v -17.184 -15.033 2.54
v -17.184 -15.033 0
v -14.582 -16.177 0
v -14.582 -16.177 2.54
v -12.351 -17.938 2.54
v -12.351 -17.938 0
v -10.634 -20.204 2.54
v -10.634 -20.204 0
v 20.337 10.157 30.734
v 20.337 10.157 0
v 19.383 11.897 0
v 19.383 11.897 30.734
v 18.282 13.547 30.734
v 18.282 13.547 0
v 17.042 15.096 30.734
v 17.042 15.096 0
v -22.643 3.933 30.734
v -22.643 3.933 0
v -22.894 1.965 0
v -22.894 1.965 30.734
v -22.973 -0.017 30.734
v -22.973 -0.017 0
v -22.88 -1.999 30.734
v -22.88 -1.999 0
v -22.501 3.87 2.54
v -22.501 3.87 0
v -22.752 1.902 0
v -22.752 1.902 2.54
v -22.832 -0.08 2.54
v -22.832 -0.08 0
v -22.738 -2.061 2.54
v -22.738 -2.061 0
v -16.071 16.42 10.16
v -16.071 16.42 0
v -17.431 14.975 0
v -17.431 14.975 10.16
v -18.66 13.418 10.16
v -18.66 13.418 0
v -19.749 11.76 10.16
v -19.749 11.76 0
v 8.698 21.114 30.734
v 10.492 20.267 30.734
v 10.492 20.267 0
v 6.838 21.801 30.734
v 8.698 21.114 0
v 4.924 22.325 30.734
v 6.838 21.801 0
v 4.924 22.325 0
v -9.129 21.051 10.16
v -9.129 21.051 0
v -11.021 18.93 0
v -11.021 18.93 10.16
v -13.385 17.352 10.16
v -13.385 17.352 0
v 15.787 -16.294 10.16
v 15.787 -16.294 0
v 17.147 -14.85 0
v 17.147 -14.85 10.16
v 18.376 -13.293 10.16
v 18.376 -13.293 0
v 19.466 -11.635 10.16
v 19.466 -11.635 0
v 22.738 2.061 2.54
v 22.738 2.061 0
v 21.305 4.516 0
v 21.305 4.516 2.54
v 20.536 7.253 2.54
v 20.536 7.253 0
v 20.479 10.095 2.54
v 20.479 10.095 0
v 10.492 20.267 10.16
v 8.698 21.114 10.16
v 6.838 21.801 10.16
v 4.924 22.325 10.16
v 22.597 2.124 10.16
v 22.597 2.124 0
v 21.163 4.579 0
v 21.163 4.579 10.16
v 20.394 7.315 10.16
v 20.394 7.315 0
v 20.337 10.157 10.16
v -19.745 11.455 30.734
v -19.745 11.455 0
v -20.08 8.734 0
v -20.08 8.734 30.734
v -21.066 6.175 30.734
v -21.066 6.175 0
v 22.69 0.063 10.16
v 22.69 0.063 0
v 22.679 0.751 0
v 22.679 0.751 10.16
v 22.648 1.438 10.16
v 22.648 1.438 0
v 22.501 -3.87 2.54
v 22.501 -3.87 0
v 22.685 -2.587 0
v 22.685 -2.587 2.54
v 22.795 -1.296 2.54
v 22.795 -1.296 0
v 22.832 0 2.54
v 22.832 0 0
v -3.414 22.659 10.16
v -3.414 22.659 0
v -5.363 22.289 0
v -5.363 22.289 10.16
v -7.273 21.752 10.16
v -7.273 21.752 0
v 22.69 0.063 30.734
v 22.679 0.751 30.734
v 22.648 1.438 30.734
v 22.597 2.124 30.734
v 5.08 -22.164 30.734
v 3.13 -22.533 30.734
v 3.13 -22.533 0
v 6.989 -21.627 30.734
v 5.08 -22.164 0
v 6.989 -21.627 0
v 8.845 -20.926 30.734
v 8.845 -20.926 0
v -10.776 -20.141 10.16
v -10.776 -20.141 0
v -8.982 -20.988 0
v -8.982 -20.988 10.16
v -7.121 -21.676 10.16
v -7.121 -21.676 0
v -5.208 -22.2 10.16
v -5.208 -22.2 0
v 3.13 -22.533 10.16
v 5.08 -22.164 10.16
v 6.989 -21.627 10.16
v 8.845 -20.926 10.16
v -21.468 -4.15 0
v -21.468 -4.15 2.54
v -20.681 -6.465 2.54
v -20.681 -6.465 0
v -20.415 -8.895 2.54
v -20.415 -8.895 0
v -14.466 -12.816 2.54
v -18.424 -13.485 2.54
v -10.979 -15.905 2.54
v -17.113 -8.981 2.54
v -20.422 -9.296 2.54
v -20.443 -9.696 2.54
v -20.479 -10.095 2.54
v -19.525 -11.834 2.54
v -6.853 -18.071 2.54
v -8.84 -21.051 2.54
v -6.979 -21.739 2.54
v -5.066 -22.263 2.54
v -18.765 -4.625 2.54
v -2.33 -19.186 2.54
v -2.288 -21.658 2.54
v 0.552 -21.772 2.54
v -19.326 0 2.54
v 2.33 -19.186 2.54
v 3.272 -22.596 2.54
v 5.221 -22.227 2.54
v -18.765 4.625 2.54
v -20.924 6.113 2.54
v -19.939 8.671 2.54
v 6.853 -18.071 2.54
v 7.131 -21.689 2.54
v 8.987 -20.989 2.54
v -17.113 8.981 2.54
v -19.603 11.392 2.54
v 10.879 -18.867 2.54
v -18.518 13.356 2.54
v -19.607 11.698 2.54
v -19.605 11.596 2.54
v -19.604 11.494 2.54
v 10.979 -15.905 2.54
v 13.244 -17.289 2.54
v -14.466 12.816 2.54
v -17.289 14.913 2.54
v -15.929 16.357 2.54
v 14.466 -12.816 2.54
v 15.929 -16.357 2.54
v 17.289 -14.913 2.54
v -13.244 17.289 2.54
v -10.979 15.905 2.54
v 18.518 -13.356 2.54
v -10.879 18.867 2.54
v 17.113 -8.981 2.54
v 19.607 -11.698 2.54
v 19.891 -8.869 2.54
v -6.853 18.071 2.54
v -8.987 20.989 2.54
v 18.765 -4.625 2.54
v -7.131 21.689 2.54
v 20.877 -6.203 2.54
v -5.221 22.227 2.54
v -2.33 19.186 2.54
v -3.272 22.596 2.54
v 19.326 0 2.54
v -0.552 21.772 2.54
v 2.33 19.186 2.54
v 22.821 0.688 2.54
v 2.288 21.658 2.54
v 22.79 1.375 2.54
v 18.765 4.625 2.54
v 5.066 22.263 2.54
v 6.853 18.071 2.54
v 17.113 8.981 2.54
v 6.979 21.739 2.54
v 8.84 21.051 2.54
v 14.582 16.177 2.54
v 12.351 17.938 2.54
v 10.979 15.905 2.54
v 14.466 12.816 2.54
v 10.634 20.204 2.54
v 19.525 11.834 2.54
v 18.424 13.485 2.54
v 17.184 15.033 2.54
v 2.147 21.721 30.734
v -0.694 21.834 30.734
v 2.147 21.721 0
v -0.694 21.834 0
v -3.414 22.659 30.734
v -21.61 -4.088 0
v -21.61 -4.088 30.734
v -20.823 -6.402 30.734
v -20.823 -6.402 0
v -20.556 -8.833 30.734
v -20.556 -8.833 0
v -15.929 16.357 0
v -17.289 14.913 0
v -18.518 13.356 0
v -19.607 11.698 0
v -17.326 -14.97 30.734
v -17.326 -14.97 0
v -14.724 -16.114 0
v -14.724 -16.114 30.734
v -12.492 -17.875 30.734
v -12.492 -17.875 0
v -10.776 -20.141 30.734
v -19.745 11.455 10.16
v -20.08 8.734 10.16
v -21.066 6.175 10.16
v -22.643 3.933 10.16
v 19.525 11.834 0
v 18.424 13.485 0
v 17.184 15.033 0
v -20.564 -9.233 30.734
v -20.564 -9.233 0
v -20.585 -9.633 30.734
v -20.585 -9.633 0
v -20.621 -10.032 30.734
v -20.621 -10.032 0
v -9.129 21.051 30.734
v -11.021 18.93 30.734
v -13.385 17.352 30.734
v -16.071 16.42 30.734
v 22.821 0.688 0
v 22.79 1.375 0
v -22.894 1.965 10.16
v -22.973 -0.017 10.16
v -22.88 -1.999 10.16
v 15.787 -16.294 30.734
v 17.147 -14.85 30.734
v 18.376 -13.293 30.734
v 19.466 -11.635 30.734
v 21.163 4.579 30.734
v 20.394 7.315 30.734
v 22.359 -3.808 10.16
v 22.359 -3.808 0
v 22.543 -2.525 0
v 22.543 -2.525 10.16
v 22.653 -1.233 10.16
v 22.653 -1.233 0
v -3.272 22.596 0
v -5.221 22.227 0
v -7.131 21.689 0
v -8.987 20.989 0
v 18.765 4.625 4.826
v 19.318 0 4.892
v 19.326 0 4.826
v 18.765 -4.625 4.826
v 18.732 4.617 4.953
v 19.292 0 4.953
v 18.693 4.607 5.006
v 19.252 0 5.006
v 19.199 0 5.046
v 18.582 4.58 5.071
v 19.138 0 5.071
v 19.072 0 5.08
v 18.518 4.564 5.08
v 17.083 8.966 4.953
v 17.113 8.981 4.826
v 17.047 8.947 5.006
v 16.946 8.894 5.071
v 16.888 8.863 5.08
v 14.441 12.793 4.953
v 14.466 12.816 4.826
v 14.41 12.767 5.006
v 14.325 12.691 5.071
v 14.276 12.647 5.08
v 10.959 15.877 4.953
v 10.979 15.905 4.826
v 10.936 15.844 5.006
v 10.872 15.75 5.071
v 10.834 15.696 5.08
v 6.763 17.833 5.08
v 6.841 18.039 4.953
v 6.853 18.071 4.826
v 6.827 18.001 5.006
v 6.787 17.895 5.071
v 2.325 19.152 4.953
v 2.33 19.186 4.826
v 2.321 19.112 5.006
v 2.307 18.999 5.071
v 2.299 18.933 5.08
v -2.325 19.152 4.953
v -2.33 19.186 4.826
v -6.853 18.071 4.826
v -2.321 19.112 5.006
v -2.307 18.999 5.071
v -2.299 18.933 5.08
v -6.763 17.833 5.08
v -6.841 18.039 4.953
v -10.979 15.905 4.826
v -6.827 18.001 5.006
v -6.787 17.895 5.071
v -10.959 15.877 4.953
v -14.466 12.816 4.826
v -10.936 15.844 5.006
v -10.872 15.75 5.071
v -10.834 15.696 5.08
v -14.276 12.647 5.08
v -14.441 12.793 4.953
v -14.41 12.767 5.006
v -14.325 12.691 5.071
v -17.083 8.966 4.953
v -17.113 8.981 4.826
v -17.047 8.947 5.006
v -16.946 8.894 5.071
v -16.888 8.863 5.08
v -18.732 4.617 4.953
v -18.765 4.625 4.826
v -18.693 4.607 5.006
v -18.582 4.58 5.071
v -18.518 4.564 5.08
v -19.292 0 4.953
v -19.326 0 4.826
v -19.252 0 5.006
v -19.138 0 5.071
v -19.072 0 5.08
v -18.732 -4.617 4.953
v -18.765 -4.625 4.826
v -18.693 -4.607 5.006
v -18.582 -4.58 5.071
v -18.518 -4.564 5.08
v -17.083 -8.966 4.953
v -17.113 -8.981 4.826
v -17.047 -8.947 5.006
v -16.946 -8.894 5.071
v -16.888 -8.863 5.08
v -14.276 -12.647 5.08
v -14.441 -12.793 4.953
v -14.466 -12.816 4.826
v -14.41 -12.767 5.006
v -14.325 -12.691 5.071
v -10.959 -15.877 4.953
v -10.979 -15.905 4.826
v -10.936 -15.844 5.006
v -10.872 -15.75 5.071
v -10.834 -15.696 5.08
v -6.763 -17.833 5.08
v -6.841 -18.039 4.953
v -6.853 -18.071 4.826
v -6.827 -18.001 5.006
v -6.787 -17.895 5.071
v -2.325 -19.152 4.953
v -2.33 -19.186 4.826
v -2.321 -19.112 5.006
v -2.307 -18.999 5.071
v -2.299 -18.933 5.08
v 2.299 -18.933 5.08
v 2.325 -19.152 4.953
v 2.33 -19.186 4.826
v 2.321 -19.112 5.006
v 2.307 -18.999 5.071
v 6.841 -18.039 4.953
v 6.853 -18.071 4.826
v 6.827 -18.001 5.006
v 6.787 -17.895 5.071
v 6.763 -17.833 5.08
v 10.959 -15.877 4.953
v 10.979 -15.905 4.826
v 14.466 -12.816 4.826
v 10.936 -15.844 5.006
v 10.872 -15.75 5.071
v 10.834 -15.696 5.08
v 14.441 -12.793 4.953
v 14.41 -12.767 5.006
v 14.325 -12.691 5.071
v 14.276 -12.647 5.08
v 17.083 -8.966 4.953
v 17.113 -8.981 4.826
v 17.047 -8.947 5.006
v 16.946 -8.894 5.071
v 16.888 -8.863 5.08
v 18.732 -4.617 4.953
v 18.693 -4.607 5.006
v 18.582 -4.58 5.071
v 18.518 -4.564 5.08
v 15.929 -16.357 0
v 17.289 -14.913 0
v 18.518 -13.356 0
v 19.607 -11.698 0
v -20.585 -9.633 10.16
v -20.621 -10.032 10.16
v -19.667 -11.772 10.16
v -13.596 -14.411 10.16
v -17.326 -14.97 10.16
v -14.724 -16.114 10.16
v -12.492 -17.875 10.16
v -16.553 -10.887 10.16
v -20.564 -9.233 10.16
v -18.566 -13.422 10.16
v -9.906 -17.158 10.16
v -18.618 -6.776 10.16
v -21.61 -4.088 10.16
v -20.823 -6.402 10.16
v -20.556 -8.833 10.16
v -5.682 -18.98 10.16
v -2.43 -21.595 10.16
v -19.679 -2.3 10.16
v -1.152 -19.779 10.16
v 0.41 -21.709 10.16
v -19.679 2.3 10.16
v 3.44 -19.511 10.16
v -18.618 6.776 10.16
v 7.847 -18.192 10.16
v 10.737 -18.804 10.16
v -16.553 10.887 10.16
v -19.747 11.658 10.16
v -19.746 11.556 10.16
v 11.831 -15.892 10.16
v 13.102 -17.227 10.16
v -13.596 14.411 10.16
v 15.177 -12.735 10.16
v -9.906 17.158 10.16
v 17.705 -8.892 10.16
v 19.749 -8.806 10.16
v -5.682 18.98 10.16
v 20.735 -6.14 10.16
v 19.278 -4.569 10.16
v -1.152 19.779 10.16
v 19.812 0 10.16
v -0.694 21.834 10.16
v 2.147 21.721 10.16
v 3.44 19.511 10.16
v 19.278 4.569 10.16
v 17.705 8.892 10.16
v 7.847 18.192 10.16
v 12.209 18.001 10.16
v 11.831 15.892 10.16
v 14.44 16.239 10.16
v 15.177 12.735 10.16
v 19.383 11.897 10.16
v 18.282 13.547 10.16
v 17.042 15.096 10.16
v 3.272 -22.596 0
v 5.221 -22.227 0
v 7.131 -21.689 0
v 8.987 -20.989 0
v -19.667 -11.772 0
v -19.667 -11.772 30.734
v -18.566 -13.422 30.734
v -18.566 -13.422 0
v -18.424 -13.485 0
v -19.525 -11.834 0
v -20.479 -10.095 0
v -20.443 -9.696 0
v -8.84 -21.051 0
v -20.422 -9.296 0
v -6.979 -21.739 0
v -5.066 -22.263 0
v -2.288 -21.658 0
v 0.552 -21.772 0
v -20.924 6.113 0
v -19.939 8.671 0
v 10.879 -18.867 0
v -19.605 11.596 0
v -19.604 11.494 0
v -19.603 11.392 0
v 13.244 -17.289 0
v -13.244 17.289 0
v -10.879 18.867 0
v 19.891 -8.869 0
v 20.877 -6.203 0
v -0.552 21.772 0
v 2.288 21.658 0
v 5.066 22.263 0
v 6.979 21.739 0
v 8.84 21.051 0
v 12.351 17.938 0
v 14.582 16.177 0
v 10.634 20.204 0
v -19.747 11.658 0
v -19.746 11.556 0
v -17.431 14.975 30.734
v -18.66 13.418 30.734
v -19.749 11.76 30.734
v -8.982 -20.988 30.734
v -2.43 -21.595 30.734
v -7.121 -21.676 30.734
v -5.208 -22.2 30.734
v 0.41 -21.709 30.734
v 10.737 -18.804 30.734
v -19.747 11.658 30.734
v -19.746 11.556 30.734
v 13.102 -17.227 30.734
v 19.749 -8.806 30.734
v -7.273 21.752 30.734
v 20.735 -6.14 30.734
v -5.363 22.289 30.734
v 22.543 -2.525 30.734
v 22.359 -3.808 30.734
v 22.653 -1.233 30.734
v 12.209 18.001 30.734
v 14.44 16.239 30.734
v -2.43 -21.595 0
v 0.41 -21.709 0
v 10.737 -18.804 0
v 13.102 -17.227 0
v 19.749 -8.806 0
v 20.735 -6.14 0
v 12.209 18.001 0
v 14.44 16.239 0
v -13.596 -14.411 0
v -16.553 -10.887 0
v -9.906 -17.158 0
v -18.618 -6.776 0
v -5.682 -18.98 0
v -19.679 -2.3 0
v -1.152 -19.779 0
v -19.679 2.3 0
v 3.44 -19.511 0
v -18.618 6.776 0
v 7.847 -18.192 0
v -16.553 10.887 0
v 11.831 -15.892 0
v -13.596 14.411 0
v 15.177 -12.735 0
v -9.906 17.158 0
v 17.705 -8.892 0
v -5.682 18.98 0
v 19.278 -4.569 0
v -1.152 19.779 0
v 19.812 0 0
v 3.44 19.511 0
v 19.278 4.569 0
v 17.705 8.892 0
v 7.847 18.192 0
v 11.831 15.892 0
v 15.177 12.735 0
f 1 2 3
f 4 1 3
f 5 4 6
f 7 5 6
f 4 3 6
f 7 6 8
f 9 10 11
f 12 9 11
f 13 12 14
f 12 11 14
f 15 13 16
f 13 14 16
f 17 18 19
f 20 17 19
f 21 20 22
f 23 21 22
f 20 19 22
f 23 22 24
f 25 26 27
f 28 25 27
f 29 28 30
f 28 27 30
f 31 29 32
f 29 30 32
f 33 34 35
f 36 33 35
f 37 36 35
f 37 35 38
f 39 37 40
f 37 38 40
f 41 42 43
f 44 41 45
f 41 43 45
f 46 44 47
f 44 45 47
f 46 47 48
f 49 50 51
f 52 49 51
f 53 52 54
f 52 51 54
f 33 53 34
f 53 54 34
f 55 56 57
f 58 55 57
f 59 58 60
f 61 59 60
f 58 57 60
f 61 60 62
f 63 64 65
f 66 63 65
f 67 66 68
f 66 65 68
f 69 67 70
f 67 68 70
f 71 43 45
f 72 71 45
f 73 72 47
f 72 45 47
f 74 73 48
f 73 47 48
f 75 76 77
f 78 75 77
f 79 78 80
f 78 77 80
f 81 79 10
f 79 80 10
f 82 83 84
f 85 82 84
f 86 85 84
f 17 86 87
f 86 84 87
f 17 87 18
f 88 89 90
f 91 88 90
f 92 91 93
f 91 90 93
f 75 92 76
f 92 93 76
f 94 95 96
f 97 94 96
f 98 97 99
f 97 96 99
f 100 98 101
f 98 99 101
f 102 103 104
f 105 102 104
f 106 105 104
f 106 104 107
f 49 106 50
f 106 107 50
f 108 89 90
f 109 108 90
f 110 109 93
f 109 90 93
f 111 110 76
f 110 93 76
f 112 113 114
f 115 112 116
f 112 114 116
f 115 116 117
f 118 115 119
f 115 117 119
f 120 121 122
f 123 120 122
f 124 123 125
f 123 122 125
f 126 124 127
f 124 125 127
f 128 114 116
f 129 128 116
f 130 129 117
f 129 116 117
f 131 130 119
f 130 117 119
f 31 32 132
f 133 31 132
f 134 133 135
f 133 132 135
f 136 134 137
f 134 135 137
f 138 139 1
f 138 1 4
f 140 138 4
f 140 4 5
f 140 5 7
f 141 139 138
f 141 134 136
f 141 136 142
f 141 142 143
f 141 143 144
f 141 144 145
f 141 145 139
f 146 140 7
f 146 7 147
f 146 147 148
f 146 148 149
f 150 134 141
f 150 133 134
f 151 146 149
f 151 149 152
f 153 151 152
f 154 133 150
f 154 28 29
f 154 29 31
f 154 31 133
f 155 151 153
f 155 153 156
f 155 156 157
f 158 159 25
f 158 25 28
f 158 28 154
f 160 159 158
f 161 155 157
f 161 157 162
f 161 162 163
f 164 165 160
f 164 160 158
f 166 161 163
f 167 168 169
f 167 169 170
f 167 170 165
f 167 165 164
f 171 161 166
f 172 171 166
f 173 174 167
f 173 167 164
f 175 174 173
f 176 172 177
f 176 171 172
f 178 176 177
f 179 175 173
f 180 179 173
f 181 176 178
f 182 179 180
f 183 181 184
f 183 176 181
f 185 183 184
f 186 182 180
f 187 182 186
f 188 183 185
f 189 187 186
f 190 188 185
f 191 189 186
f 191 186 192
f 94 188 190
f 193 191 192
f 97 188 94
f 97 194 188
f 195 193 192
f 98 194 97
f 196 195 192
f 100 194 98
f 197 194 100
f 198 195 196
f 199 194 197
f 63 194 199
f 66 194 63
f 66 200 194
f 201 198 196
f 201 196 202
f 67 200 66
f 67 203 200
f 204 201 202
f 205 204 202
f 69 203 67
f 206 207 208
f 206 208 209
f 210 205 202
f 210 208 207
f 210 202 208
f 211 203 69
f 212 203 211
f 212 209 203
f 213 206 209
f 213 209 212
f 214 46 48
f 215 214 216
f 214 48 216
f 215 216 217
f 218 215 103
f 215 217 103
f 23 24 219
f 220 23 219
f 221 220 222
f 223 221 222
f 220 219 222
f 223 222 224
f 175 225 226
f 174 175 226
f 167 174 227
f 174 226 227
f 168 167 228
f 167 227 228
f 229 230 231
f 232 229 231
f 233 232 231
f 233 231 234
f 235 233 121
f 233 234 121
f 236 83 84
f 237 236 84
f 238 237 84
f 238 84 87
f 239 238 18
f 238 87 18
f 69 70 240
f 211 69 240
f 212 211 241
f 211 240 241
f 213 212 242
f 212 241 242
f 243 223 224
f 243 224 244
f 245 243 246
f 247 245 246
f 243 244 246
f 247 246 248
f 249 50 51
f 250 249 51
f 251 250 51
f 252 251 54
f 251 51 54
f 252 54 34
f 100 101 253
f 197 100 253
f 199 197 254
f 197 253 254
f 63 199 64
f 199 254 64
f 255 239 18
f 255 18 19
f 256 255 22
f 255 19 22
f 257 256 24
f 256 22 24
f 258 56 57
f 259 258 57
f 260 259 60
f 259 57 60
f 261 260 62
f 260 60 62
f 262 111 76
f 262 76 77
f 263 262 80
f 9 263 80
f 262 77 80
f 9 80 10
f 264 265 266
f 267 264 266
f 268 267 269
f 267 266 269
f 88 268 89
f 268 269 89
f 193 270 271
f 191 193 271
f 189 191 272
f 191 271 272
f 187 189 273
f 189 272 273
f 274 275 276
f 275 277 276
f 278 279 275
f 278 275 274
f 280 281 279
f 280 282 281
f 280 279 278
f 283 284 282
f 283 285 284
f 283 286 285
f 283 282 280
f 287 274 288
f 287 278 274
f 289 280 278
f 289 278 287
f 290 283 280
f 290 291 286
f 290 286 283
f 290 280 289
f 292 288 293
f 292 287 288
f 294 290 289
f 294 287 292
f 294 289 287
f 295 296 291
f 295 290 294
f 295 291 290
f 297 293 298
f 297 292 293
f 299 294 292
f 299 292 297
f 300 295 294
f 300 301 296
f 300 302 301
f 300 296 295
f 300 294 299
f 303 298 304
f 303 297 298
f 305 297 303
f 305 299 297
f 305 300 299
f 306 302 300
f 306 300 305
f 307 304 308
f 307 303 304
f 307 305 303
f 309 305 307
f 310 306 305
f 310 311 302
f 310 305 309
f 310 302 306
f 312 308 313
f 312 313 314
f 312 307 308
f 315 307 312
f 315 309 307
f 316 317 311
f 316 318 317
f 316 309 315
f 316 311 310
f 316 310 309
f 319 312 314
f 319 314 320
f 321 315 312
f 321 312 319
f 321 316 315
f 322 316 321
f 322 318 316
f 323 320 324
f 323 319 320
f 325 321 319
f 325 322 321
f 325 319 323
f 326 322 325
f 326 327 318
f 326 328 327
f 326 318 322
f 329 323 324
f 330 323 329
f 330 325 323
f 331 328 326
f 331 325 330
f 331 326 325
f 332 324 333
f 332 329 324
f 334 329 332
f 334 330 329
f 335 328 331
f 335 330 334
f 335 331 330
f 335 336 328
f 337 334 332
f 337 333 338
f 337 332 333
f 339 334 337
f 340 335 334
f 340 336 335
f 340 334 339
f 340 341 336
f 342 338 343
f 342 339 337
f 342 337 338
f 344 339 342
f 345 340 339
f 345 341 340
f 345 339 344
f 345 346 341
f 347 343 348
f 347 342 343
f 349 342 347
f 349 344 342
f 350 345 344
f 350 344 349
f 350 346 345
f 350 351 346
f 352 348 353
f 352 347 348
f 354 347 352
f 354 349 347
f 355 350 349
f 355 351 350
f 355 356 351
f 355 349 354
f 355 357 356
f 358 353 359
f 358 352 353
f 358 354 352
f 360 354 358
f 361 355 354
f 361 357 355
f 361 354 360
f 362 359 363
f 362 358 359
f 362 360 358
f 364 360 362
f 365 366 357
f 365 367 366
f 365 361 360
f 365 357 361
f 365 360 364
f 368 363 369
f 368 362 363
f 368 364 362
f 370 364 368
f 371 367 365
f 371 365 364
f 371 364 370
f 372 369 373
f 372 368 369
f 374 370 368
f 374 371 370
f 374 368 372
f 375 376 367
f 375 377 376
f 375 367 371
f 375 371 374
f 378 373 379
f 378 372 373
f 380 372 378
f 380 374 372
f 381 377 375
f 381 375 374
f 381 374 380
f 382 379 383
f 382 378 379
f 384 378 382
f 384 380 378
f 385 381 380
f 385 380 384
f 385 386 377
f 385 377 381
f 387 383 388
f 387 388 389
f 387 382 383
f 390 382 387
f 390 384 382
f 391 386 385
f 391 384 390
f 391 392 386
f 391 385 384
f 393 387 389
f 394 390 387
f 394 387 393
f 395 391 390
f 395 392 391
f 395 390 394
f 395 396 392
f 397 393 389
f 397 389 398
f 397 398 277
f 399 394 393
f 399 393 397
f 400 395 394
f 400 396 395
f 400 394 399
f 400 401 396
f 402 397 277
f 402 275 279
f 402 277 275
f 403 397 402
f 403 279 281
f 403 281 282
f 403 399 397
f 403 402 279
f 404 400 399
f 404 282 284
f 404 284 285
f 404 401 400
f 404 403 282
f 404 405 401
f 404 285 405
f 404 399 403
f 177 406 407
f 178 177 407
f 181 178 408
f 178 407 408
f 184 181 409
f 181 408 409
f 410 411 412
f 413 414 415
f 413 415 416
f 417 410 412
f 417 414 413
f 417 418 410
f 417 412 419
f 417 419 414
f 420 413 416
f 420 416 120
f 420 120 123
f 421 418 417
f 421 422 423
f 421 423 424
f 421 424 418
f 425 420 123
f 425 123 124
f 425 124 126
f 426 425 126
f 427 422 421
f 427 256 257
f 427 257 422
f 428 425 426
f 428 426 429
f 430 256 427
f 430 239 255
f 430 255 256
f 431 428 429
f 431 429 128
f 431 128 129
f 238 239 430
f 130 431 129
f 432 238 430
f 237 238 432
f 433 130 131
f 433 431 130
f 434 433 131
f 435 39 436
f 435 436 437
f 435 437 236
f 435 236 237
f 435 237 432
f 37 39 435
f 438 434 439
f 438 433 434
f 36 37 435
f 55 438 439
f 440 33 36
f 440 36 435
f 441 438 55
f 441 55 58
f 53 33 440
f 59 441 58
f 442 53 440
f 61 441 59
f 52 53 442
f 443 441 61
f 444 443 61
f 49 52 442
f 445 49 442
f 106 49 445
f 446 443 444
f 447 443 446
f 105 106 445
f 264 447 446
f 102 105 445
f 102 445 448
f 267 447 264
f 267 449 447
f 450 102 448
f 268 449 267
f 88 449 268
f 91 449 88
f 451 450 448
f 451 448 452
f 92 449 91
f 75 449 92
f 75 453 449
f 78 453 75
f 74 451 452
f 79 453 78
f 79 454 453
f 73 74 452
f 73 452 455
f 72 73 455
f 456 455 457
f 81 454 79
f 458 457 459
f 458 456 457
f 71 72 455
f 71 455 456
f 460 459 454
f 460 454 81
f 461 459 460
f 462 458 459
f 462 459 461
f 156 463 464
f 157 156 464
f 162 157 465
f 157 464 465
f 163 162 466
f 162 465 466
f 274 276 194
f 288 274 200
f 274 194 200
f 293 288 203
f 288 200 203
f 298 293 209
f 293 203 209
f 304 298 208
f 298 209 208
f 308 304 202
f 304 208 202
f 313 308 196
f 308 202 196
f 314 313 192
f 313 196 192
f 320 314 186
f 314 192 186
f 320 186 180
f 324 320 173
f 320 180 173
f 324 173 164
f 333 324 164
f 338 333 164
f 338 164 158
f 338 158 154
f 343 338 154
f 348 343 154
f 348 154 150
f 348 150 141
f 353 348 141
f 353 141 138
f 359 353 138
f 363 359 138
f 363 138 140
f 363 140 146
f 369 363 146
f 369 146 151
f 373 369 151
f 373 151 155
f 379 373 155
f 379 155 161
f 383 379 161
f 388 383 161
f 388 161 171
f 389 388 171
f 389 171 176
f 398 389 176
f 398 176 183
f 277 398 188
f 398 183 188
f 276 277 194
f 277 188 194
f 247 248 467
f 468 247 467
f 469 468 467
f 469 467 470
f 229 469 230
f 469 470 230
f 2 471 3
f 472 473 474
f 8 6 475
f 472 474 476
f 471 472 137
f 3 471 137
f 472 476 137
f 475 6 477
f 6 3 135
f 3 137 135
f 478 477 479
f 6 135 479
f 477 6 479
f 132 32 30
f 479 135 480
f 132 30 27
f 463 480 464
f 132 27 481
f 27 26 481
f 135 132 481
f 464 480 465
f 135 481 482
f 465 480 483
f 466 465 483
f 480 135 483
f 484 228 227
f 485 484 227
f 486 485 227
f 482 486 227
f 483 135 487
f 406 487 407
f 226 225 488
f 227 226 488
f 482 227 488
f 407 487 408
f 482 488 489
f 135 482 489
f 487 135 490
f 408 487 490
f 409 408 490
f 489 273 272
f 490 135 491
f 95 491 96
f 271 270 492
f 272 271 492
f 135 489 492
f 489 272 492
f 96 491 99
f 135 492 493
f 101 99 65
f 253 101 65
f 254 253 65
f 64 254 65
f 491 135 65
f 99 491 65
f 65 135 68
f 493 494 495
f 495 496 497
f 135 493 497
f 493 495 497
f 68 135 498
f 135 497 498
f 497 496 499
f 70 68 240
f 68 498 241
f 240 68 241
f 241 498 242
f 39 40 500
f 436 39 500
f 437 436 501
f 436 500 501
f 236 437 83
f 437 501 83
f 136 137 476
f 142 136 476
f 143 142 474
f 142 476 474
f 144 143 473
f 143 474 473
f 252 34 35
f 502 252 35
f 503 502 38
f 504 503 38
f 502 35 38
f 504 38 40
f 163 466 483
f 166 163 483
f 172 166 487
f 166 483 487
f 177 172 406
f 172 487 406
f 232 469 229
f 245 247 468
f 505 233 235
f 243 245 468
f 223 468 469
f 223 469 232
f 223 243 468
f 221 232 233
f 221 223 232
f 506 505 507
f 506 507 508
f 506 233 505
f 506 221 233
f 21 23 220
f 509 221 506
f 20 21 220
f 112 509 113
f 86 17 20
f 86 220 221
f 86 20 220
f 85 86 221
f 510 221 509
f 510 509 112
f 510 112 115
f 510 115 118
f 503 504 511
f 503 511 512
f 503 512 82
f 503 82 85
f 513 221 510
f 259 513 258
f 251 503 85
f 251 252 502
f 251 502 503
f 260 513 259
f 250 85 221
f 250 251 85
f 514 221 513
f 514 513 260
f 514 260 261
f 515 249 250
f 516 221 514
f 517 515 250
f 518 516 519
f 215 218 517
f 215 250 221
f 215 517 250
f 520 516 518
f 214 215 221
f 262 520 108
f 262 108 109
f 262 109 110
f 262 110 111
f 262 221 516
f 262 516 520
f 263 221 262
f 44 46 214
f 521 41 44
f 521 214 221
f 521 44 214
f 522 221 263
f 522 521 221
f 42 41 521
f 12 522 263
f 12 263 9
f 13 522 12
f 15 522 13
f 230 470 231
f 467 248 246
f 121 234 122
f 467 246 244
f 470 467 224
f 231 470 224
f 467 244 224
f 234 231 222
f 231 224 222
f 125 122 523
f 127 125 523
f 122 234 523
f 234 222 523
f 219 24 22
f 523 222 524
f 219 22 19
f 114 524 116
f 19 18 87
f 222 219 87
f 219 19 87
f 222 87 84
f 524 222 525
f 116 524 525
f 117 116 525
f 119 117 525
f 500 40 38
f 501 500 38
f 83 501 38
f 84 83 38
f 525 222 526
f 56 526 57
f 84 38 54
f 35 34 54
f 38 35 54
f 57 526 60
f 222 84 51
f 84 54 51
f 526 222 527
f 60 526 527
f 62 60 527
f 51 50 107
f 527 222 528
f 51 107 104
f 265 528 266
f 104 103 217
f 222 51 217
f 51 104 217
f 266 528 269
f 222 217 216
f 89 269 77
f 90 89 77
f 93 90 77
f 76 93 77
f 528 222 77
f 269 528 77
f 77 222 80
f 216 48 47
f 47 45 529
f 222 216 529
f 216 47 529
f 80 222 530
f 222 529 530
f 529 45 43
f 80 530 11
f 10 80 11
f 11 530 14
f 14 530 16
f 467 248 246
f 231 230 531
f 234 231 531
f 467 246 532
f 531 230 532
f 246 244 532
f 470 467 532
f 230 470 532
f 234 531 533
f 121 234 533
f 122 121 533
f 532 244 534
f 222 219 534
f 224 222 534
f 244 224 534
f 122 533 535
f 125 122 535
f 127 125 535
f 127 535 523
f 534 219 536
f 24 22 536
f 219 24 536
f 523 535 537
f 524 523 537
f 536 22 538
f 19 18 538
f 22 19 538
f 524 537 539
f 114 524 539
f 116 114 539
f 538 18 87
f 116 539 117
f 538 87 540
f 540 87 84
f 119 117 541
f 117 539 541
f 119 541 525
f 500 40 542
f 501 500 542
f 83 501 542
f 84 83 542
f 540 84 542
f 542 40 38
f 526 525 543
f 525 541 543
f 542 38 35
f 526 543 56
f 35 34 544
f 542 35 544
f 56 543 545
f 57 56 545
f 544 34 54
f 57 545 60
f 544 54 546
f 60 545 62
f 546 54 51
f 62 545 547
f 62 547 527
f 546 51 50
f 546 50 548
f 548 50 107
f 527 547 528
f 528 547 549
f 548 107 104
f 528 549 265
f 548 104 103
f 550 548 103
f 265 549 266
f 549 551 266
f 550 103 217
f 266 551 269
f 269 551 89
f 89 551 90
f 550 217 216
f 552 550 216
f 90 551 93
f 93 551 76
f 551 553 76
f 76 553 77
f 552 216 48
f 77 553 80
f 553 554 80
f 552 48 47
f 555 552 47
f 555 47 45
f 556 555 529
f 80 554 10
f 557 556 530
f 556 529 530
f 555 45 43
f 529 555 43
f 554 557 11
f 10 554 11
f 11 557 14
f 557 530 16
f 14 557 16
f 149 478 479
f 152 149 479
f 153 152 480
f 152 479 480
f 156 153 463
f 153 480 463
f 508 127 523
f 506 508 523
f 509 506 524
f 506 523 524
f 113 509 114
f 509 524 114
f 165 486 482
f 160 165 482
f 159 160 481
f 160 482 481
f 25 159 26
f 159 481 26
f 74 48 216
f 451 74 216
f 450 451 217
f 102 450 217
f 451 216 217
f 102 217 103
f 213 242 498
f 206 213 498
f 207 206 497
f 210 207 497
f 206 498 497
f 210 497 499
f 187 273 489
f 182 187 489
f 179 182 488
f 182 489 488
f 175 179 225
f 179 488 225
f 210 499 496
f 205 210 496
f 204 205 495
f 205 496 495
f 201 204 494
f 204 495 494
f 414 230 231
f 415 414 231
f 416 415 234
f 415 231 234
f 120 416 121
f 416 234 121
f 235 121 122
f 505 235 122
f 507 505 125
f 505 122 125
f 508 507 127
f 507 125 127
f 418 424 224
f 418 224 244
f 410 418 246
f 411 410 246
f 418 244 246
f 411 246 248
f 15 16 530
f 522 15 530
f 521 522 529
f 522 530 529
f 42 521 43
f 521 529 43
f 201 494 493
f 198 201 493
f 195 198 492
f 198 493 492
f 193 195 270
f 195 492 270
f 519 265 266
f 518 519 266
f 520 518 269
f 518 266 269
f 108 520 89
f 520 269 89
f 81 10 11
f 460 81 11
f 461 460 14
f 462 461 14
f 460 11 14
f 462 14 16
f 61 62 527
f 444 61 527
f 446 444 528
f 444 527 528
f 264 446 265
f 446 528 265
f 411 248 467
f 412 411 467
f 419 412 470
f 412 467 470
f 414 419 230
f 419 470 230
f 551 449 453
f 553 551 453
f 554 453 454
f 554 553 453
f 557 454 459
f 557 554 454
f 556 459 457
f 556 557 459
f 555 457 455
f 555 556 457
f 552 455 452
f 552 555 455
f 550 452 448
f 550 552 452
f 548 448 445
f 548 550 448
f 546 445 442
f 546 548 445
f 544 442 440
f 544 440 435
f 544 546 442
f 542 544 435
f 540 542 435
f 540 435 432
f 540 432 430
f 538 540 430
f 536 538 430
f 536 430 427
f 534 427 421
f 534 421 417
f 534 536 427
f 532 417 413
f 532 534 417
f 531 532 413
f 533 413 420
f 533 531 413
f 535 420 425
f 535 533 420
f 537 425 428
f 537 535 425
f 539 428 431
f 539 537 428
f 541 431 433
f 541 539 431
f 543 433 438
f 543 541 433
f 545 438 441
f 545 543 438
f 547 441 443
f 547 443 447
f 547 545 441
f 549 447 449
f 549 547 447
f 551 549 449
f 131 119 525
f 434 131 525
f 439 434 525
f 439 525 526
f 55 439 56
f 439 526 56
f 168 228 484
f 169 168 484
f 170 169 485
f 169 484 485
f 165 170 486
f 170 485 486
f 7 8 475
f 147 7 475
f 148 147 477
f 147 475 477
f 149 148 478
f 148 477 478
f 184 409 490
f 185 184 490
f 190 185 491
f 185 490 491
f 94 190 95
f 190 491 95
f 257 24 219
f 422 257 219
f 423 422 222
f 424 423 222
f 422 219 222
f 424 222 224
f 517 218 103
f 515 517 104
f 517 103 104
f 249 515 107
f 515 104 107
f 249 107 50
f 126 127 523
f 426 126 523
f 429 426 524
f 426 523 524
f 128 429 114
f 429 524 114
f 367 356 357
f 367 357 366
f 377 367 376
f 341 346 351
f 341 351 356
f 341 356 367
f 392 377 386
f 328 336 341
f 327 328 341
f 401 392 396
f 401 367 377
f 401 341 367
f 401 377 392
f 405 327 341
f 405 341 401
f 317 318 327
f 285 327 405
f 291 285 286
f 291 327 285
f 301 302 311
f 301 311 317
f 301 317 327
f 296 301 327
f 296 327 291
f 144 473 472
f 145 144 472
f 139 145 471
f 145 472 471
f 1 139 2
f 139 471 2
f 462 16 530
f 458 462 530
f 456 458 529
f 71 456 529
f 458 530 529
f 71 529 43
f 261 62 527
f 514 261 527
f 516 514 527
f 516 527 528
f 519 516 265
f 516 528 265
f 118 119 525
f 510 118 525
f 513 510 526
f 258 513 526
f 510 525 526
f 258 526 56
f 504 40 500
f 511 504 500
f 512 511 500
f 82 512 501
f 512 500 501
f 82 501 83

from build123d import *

# Parameters (mm, degrees)
F1_DEPTH  = 2.54
F2_R      = 19.326494
F3_DEPTH  = 5.08
F4_R      = 0.254
F9_R      = 19.81247
F10_DEPTH = 10.16
F11_R     = 19.81247
F12_DEPTH = 30.734


with BuildPart() as f1:
    # F0 (on Top) → F1 (new body)
    with BuildSketch(Plane.XY):
        with BuildLine():
            ThreePointArc((22.501266, -3.870398), (22.748949, -1.942239), (22.83171, 0))
            ThreePointArc((22.83171, 0), (22.808385, 1.031768), (22.738458, 2.061429))
            ThreePointArc((22.738458, 2.061429), (20.83326, 5.859957), (20.47887, 10.094695))
            ThreePointArc((20.47887, 10.094695), (18.992685, 12.671419), (17.184122, 15.033061))
            ThreePointArc((17.184122, 15.033061), (13.410065, 16.986288), (10.634241, 20.203957))
            ThreePointArc((10.634241, 20.203957), (7.917332, 21.415014), (5.066035, 22.262575))
            ThreePointArc((5.066035, 22.262575), (0.864681, 21.624434), (-3.272307, 22.595995))
            ThreePointArc((-3.272307, 22.595995), (-6.182174, 21.978801), (-8.987105, 20.988542))
            ThreePointArc((-8.987105, 20.988542), (-12.010982, 18.002781), (-15.928944, 16.35713))
            ThreePointArc((-15.928944, 16.35713), (-17.920299, 14.147433), (-19.607476, 11.6976))
            ThreePointArc((-19.607476, 11.6976), (-19.604348, 11.544731), (-19.603305, 11.391835))
            ThreePointArc((-19.603305, 11.391835), (-20.352856, 7.36163), (-22.501266, 3.870398))
            ThreePointArc((-22.501266, 3.870398), (-22.813479, 0.912227), (-22.738458, -2.061429))
            ThreePointArc((-22.738458, -2.061429), (-21.011387, -5.286146), (-20.414509, -8.895206))
            ThreePointArc((-20.414509, -8.895206), (-20.430611, -9.495813), (-20.47887, -10.094695))
            ThreePointArc((-20.47887, -10.094695), (-18.992685, -12.671419), (-17.184122, -15.033061))
            ThreePointArc((-17.184122, -15.033061), (-13.410065, -16.986288), (-10.634241, -20.203957))
            ThreePointArc((-10.634241, -20.203957), (-7.917332, -21.415014), (-5.066035, -22.262575))
            ThreePointArc((-5.066035, -22.262575), (-0.864681, -21.624434), (3.272307, -22.595995))
            ThreePointArc((3.272307, -22.595995), (6.182174, -21.978801), (8.987105, -20.988542))
            ThreePointArc((8.987105, -20.988542), (12.010982, -18.002781), (15.928944, -16.35713))
            ThreePointArc((15.928944, -16.35713), (17.920299, -14.147433), (19.607476, -11.6976))
            ThreePointArc((19.607476, -11.6976), (20.298858, -7.504678), (22.501266, -3.870398))
        make_face()
    extrude(amount=F1_DEPTH)

    # F2 (on Top) → F3 (join)
    with BuildSketch(Plane.XY):
        Circle(F2_R)
    extrude(amount=F3_DEPTH)

    # F4
    f4_edges = [f1.edges().sort_by_distance(p)[0] for p in [
        (-19.326494, 0, 5.08),
    ]]
    fillet(f4_edges, radius=F4_R)


with BuildPart() as f5_1:
    # F5: copy of F1
    add(f1.part)


with BuildPart() as f7_1:
    # F7: copy of F1
    add(f1.part.moved(Location((0, 0, 6.35))))


with BuildPart() as f10:
    # F9 (on Top) → F10 (new body)
    with BuildSketch(Plane.XY):
        with BuildLine():
            ThreePointArc((22.359341, -3.8077), (22.607024, -1.879542), (22.689784, 0.062698))
            ThreePointArc((22.689784, 0.062698), (22.66646, 1.094466), (22.596533, 2.124126))
            ThreePointArc((22.596533, 2.124126), (20.691335, 5.922655), (20.336944, 10.157392))
            ThreePointArc((20.336944, 10.157392), (18.85076, 12.734117), (17.042197, 15.095759))
            ThreePointArc((17.042197, 15.095759), (13.26814, 17.048985), (10.492316, 20.266655))
            ThreePointArc((10.492316, 20.266655), (7.775406, 21.477712), (4.92411, 22.325273))
            ThreePointArc((4.92411, 22.325273), (0.722756, 21.687132), (-3.414232, 22.658692))
            ThreePointArc((-3.414232, 22.658692), (-6.324099, 22.041499), (-9.12903, 21.05124))
            ThreePointArc((-9.12903, 21.05124), (-12.152907, 18.065479), (-16.070869, 16.419828))
            ThreePointArc((-16.070869, 16.419828), (-18.062224, 14.210131), (-19.749402, 11.760297))
            ThreePointArc((-19.749402, 11.760297), (-19.746274, 11.607429), (-19.745231, 11.454532))
            ThreePointArc((-19.745231, 11.454532), (-20.494781, 7.424328), (-22.643192, 3.933095))
            ThreePointArc((-22.643192, 3.933095), (-22.955404, 0.974924), (-22.880383, -1.998731))
            ThreePointArc((-22.880383, -1.998731), (-21.153313, -5.223449), (-20.556434, -8.832509))
            ThreePointArc((-20.556434, -8.832509), (-20.572536, -9.433116), (-20.620795, -10.031997))
            ThreePointArc((-20.620795, -10.031997), (-19.134611, -12.608722), (-17.326047, -14.970364))
            ThreePointArc((-17.326047, -14.970364), (-13.55199, -16.92359), (-10.776166, -20.14126))
            ThreePointArc((-10.776166, -20.14126), (-8.059257, -21.352316), (-5.20796, -22.199878))
            ThreePointArc((-5.20796, -22.199878), (-1.006606, -21.561736), (3.130381, -22.533297))
            ThreePointArc((3.130381, -22.533297), (6.040248, -21.916104), (8.84518, -20.925845))
            ThreePointArc((8.84518, -20.925845), (11.869056, -17.940084), (15.787019, -16.294433))
            ThreePointArc((15.787019, -16.294433), (17.778373, -14.084736), (19.465551, -11.634902))
            ThreePointArc((19.465551, -11.634902), (20.156932, -7.441981), (22.359341, -3.8077))
        make_face()
        Circle(F9_R, mode=Mode.SUBTRACT)
    extrude(amount=F10_DEPTH)


with BuildPart() as f12:
    # F11 (on face) → F12 (new body)
    with BuildSketch(Plane.XY):
        with BuildLine():
            ThreePointArc((19.465551, -11.634902), (20.156932, -7.441981), (22.359341, -3.8077))
            ThreePointArc((22.359341, -3.8077), (22.607024, -1.879542), (22.689784, 0.062698))
            ThreePointArc((22.689784, 0.062698), (22.66646, 1.094466), (22.596533, 2.124126))
            ThreePointArc((22.596533, 2.124126), (20.691335, 5.922655), (20.336944, 10.157392))
            ThreePointArc((20.336944, 10.157392), (18.85076, 12.734117), (17.042197, 15.095759))
            ThreePointArc((17.042197, 15.095759), (13.26814, 17.048985), (10.492316, 20.266655))
            ThreePointArc((10.492316, 20.266655), (7.775406, 21.477712), (4.92411, 22.325273))
            ThreePointArc((4.92411, 22.325273), (0.722756, 21.687132), (-3.414232, 22.658692))
            ThreePointArc((-3.414232, 22.658692), (-6.324099, 22.041499), (-9.12903, 21.05124))
            ThreePointArc((-9.12903, 21.05124), (-12.152907, 18.065479), (-16.070869, 16.419828))
            ThreePointArc((-16.070869, 16.419828), (-18.062224, 14.210131), (-19.749402, 11.760297))
            ThreePointArc((-19.749402, 11.760297), (-19.746274, 11.607429), (-19.745231, 11.454532))
            ThreePointArc((-19.745231, 11.454532), (-20.494781, 7.424328), (-22.643192, 3.933095))
            ThreePointArc((-22.643192, 3.933095), (-22.955404, 0.974924), (-22.880383, -1.998731))
            ThreePointArc((-22.880383, -1.998731), (-21.153313, -5.223449), (-20.556434, -8.832509))
            ThreePointArc((-20.556434, -8.832509), (-20.572536, -9.433116), (-20.620795, -10.031997))
            ThreePointArc((-20.620795, -10.031997), (-19.134611, -12.608722), (-17.326047, -14.970364))
            ThreePointArc((-17.326047, -14.970364), (-13.55199, -16.92359), (-10.776166, -20.14126))
            ThreePointArc((-10.776166, -20.14126), (-8.059257, -21.352316), (-5.20796, -22.199878))
            ThreePointArc((-5.20796, -22.199878), (-1.006606, -21.561736), (3.130381, -22.533297))
            ThreePointArc((3.130381, -22.533297), (6.040248, -21.916104), (8.84518, -20.925845))
            ThreePointArc((8.84518, -20.925845), (11.869056, -17.940084), (15.787019, -16.294433))
            ThreePointArc((15.787019, -16.294433), (17.778373, -14.084736), (19.465551, -11.634902))
        make_face()
        Circle(F11_R, mode=Mode.SUBTRACT)
        Circle(F11_R)
    extrude(amount=F12_DEPTH)


solid = Compound([f1.part, f10.part, f12.part])
